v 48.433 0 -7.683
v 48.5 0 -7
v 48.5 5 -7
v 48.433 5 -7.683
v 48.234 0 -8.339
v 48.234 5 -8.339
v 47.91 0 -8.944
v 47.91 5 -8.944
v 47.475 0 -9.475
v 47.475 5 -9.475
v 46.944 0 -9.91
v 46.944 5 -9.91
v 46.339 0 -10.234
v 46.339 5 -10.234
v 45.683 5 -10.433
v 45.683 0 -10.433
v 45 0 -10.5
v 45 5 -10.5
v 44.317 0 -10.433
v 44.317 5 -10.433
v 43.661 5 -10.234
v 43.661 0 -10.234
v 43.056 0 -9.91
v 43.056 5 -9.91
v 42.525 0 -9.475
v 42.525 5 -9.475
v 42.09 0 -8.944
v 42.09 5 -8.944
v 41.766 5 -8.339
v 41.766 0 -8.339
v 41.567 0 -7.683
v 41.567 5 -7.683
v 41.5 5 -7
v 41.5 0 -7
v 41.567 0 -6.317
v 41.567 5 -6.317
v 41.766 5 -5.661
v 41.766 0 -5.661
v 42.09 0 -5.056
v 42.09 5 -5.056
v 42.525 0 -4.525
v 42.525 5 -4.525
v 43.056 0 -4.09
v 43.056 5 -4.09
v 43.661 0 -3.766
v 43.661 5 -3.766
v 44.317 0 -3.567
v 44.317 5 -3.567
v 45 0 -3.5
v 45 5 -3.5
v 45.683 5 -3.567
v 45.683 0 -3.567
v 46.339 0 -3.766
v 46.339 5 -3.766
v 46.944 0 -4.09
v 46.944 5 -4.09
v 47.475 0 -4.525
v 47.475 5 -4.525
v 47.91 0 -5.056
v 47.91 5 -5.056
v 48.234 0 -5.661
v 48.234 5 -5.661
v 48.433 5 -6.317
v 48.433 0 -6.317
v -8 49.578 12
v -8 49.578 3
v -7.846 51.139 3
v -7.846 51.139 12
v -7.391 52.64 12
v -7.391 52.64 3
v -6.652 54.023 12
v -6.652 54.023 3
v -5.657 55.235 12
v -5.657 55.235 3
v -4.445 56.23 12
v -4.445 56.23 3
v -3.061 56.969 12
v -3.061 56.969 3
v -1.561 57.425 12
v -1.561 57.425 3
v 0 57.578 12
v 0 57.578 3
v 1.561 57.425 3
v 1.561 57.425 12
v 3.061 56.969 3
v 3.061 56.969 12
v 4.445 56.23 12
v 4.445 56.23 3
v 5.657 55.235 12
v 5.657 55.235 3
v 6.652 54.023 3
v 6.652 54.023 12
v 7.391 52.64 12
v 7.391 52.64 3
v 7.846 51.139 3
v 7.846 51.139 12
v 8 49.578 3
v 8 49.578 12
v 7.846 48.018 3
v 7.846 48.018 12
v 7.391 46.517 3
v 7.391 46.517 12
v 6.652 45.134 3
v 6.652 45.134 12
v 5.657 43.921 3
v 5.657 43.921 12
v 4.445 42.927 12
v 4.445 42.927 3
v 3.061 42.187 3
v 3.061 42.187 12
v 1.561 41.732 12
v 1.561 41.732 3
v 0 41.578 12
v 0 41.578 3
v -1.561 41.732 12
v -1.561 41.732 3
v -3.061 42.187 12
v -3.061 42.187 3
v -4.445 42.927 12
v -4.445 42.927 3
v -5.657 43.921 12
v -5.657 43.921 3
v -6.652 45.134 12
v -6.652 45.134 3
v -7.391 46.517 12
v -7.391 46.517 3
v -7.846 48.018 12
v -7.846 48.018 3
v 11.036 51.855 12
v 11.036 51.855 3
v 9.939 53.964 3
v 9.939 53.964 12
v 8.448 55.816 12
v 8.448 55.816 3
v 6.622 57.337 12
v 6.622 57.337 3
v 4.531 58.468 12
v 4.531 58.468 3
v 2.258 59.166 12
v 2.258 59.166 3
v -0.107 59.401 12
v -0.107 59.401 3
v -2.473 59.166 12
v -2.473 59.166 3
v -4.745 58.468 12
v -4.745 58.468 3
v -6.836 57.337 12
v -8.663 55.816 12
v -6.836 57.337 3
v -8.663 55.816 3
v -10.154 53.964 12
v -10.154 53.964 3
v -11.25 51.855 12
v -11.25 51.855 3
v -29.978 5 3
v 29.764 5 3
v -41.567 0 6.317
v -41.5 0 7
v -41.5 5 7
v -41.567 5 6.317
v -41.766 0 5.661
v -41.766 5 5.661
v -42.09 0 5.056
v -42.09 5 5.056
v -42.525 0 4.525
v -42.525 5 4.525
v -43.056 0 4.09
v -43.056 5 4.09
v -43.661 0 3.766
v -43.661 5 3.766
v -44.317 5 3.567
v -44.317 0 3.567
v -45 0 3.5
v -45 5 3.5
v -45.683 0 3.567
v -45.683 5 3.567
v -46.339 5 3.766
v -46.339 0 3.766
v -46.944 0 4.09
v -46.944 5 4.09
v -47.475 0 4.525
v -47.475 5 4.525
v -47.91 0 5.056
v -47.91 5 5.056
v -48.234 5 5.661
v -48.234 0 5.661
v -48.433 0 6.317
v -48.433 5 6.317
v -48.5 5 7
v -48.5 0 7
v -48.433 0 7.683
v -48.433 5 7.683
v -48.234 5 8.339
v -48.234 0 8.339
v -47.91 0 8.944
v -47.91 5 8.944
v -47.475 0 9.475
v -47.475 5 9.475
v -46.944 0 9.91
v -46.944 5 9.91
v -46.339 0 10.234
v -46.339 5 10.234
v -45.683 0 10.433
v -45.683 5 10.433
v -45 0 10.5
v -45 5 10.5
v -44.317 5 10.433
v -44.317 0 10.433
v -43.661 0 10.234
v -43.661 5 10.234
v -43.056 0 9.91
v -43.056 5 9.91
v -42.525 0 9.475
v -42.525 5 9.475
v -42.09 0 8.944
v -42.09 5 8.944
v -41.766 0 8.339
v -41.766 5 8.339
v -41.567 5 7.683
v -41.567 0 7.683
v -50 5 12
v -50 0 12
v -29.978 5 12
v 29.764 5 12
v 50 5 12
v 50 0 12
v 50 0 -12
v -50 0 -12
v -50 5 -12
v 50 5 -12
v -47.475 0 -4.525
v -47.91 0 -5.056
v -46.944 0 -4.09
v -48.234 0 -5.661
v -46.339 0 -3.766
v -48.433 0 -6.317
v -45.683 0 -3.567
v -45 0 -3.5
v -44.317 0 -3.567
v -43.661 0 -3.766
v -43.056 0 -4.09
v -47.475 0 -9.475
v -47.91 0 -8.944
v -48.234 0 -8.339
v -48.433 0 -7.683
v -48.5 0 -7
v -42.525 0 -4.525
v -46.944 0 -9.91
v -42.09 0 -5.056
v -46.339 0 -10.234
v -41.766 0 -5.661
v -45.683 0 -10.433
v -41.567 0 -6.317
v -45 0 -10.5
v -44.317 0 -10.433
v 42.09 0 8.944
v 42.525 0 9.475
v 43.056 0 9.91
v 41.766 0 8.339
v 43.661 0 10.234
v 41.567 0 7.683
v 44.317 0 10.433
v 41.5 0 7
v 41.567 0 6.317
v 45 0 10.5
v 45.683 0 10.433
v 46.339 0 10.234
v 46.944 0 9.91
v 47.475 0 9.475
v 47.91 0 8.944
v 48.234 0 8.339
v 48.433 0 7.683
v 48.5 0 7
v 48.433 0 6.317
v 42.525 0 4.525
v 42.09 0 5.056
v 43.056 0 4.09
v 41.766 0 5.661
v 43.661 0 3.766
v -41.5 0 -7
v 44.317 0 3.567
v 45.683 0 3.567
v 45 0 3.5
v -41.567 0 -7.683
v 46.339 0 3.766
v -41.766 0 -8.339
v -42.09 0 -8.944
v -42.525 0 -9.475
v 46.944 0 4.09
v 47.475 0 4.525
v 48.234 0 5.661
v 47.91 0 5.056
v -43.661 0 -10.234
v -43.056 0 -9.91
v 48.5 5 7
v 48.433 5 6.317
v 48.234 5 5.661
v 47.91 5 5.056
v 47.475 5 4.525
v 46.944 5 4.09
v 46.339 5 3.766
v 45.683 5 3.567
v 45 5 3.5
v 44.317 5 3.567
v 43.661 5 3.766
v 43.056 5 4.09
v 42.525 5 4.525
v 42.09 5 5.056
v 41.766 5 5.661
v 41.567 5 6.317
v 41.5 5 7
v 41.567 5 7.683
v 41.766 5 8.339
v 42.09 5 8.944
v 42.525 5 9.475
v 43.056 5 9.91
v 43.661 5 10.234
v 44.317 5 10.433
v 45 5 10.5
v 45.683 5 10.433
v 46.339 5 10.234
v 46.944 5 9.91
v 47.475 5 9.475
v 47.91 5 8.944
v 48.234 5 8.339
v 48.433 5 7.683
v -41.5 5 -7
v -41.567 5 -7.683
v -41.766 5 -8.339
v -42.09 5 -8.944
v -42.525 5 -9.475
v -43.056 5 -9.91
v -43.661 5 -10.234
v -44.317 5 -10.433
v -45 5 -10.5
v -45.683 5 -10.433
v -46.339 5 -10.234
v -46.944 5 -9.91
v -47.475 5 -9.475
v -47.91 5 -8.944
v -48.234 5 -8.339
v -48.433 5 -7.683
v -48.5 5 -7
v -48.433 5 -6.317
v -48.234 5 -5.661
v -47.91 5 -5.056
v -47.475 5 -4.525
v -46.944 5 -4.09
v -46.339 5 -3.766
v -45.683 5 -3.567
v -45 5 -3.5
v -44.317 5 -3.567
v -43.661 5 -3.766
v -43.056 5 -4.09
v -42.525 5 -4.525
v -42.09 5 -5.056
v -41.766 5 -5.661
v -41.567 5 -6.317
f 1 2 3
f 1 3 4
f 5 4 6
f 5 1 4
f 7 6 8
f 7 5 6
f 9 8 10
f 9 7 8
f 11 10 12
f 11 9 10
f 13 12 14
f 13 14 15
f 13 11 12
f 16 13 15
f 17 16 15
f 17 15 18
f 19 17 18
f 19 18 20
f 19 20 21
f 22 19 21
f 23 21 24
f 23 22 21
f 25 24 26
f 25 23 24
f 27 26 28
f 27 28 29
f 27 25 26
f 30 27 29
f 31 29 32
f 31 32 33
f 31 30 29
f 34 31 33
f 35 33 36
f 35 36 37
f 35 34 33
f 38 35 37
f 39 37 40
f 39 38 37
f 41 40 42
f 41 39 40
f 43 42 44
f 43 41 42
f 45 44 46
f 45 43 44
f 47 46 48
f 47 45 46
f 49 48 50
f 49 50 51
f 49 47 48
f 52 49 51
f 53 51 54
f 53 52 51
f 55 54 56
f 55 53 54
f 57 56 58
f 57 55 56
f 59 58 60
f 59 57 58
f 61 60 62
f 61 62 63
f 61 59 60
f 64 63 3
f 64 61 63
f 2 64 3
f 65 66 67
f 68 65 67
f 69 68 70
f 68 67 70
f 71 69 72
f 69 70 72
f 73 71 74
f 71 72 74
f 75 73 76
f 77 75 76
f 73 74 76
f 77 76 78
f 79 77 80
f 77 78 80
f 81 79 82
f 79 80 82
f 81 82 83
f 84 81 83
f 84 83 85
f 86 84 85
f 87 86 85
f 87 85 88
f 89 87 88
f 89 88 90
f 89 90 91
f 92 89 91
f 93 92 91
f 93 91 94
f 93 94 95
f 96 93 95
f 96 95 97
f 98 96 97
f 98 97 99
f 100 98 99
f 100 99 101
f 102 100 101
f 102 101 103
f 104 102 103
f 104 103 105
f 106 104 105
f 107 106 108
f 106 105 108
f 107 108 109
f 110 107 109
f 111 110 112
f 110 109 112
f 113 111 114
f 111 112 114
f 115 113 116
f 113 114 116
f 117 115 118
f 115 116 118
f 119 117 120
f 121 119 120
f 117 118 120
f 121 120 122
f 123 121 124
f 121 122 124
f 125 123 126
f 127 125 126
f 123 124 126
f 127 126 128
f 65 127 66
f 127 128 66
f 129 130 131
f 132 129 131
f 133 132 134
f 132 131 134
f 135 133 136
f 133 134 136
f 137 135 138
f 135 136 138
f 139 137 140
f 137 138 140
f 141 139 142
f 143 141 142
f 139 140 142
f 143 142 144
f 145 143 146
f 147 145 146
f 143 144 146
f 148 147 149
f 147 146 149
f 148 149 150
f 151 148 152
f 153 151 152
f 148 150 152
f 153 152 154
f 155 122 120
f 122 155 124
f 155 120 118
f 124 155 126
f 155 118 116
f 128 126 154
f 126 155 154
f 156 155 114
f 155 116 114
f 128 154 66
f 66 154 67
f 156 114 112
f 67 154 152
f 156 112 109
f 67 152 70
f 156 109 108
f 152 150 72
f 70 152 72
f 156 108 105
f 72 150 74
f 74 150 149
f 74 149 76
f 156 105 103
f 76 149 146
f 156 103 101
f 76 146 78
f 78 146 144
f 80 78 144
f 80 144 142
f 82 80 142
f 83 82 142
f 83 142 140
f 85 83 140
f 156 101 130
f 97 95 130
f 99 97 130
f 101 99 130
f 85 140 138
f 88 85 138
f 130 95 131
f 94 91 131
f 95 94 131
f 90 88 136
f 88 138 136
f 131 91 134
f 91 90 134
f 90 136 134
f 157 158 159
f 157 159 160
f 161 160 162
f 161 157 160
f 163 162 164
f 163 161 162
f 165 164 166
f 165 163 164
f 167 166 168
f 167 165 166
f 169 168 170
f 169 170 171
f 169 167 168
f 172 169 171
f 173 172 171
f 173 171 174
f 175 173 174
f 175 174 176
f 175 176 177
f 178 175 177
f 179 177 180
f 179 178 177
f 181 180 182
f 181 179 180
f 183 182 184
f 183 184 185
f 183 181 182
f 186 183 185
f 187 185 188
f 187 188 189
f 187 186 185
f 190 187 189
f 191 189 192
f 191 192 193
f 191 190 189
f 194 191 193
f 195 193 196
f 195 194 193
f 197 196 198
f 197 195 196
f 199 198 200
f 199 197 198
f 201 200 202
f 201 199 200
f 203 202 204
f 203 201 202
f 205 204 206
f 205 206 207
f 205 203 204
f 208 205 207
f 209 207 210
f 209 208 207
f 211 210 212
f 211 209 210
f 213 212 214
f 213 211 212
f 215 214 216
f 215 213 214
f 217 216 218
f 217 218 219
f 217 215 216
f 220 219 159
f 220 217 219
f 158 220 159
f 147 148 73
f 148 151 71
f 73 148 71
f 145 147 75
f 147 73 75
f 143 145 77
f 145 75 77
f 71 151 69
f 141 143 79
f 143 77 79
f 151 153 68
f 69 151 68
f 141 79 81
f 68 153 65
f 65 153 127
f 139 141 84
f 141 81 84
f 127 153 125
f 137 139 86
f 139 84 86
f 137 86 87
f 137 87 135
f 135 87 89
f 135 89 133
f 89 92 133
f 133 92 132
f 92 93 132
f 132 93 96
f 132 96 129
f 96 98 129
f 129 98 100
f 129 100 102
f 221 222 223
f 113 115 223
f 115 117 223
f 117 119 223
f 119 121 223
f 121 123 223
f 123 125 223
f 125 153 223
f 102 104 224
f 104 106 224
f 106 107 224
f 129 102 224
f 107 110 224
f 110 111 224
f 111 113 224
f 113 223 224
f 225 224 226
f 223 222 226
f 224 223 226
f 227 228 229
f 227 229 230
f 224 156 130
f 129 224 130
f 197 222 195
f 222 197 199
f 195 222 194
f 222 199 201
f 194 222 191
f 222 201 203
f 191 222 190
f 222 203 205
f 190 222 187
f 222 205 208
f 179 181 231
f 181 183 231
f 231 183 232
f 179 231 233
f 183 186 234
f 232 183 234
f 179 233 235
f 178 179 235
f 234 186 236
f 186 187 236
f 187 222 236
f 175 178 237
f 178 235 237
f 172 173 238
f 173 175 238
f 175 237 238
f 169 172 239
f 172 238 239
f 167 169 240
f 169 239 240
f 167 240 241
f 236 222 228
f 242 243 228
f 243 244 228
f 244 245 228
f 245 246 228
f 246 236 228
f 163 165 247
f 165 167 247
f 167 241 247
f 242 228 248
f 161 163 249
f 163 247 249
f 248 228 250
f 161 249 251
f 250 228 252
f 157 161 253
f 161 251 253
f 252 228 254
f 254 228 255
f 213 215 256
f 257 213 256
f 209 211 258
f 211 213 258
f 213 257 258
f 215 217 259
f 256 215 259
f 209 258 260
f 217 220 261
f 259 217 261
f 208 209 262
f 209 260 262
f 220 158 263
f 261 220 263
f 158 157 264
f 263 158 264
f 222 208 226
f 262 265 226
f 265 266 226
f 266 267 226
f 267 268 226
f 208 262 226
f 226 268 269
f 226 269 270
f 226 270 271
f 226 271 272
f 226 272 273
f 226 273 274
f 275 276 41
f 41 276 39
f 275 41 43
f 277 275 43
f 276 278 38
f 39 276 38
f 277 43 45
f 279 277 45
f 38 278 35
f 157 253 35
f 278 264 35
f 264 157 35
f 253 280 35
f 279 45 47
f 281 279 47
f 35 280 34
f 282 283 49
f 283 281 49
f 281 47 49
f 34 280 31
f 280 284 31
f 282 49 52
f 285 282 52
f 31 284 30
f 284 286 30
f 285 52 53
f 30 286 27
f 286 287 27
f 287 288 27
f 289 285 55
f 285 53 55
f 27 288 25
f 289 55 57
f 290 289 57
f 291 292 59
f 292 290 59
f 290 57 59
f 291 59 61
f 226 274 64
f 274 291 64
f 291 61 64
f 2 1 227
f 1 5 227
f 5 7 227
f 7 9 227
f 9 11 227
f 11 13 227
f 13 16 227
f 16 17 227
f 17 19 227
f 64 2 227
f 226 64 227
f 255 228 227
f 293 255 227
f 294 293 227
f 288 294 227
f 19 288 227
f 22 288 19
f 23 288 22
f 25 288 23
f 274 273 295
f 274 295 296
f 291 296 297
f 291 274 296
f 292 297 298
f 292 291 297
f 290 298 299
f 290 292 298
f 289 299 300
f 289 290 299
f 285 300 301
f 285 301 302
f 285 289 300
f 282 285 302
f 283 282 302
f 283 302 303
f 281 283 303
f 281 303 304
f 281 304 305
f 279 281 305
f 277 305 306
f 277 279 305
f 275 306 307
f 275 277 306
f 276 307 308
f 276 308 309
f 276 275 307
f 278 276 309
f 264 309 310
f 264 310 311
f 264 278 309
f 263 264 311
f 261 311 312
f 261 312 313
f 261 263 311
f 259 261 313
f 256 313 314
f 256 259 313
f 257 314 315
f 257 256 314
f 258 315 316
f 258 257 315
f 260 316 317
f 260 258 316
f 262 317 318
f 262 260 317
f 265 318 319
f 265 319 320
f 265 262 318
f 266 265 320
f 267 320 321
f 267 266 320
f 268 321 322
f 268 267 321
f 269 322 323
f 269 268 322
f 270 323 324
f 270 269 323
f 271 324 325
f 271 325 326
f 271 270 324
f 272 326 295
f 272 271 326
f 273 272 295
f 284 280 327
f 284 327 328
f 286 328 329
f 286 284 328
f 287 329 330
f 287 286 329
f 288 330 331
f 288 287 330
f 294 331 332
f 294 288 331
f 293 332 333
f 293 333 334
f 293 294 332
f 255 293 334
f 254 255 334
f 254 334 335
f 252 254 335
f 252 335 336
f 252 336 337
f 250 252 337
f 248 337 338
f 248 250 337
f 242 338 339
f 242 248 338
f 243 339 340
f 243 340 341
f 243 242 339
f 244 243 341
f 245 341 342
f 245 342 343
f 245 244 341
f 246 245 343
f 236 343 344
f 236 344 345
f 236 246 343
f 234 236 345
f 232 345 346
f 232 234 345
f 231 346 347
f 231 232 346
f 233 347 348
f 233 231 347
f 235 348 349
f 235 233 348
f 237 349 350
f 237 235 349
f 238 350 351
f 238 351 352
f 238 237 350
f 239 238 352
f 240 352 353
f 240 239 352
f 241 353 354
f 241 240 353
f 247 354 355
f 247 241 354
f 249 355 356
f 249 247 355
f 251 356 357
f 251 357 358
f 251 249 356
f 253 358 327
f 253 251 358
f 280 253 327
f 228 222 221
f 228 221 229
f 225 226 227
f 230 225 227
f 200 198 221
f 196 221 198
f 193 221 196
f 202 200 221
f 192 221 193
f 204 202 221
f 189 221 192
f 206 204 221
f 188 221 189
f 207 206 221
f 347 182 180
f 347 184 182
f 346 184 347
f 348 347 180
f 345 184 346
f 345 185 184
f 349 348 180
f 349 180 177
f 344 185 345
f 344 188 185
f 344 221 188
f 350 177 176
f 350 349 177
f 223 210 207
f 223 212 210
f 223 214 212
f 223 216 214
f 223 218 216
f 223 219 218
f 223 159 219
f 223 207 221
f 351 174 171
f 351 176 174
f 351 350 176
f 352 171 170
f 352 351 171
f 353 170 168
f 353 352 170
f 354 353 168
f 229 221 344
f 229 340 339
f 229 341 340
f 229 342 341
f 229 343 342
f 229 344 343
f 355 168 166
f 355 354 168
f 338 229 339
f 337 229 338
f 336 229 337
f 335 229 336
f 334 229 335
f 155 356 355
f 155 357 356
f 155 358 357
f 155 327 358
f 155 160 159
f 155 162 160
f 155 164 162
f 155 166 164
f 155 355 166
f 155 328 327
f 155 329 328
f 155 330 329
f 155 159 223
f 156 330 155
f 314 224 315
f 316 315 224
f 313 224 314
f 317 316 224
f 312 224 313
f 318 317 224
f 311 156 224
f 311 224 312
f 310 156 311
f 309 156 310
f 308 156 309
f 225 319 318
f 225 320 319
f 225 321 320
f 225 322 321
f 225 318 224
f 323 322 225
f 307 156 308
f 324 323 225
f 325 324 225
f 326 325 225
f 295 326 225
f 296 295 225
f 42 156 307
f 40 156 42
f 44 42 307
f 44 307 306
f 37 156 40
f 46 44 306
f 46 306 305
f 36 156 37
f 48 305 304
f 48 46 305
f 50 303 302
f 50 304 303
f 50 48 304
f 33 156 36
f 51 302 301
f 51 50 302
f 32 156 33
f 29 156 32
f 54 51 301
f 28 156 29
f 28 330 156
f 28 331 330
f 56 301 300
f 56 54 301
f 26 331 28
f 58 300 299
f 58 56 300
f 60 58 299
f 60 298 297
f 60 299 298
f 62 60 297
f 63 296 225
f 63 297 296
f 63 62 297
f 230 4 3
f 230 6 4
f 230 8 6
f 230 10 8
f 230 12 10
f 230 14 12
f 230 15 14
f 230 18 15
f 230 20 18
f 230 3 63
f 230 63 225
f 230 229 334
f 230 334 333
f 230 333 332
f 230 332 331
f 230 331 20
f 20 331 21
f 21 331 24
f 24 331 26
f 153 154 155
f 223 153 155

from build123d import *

# Parameters (mm, degrees)
SKETCH1_W           = 100
SKETCH1_H           = 24
SKETCH1_R           = 3.5
BOSS_EXTRUDE1_DEPTH = 5
BOSS_EXTRUDE2_DEPTH = 9
SKETCH3_R           = 8
CUT_EXTRUDE1_DEPTH  = 10


with BuildPart() as part:
    # Sketch1 → Boss-Extrude1 (new body)
    with BuildSketch(Plane(origin=(0, 0, 0), x_dir=(1, 0, 0), z_dir=(0, 1, 0))):
        Rectangle(SKETCH1_W, SKETCH1_H)
        with Locations((-45, 7)):
            Circle(SKETCH1_R, mode=Mode.SUBTRACT)
        with Locations((-45, -7)):
            Circle(SKETCH1_R, mode=Mode.SUBTRACT)
        with Locations((45, 7)):
            Circle(SKETCH1_R, mode=Mode.SUBTRACT)
        with Locations((45, -7)):
            Circle(SKETCH1_R, mode=Mode.SUBTRACT)
    extrude(amount=BOSS_EXTRUDE1_DEPTH)

    # Sketch2 → Boss-Extrude2 (add)
    with BuildSketch(Plane.XY.offset(3)):
        with BuildLine():
            Line((-29.978021695, 5), (29.763516014, 5))
            Line((29.763516014, 5), (11.035619534, 51.854874594))
            ThreePointArc((11.035619534, 51.854874594), (-0.107252841, 59.401067767), (-11.250125215, 51.854874594))
            Line((-11.250125215, 51.854874594), (-29.978021695, 5))
        make_face()
    extrude(amount=BOSS_EXTRUDE2_DEPTH)

    # Sketch3 → Cut-Extrude1 (cut, through all)
    with BuildSketch(Plane(origin=(0, 0, 3), x_dir=(-1, 0, 0), z_dir=(0, 0, -1))):
        with Locations((0, 49.578279074)):
            Circle(SKETCH3_R)
    extrude(amount=-CUT_EXTRUDE1_DEPTH, mode=Mode.SUBTRACT)


solid = part.part
